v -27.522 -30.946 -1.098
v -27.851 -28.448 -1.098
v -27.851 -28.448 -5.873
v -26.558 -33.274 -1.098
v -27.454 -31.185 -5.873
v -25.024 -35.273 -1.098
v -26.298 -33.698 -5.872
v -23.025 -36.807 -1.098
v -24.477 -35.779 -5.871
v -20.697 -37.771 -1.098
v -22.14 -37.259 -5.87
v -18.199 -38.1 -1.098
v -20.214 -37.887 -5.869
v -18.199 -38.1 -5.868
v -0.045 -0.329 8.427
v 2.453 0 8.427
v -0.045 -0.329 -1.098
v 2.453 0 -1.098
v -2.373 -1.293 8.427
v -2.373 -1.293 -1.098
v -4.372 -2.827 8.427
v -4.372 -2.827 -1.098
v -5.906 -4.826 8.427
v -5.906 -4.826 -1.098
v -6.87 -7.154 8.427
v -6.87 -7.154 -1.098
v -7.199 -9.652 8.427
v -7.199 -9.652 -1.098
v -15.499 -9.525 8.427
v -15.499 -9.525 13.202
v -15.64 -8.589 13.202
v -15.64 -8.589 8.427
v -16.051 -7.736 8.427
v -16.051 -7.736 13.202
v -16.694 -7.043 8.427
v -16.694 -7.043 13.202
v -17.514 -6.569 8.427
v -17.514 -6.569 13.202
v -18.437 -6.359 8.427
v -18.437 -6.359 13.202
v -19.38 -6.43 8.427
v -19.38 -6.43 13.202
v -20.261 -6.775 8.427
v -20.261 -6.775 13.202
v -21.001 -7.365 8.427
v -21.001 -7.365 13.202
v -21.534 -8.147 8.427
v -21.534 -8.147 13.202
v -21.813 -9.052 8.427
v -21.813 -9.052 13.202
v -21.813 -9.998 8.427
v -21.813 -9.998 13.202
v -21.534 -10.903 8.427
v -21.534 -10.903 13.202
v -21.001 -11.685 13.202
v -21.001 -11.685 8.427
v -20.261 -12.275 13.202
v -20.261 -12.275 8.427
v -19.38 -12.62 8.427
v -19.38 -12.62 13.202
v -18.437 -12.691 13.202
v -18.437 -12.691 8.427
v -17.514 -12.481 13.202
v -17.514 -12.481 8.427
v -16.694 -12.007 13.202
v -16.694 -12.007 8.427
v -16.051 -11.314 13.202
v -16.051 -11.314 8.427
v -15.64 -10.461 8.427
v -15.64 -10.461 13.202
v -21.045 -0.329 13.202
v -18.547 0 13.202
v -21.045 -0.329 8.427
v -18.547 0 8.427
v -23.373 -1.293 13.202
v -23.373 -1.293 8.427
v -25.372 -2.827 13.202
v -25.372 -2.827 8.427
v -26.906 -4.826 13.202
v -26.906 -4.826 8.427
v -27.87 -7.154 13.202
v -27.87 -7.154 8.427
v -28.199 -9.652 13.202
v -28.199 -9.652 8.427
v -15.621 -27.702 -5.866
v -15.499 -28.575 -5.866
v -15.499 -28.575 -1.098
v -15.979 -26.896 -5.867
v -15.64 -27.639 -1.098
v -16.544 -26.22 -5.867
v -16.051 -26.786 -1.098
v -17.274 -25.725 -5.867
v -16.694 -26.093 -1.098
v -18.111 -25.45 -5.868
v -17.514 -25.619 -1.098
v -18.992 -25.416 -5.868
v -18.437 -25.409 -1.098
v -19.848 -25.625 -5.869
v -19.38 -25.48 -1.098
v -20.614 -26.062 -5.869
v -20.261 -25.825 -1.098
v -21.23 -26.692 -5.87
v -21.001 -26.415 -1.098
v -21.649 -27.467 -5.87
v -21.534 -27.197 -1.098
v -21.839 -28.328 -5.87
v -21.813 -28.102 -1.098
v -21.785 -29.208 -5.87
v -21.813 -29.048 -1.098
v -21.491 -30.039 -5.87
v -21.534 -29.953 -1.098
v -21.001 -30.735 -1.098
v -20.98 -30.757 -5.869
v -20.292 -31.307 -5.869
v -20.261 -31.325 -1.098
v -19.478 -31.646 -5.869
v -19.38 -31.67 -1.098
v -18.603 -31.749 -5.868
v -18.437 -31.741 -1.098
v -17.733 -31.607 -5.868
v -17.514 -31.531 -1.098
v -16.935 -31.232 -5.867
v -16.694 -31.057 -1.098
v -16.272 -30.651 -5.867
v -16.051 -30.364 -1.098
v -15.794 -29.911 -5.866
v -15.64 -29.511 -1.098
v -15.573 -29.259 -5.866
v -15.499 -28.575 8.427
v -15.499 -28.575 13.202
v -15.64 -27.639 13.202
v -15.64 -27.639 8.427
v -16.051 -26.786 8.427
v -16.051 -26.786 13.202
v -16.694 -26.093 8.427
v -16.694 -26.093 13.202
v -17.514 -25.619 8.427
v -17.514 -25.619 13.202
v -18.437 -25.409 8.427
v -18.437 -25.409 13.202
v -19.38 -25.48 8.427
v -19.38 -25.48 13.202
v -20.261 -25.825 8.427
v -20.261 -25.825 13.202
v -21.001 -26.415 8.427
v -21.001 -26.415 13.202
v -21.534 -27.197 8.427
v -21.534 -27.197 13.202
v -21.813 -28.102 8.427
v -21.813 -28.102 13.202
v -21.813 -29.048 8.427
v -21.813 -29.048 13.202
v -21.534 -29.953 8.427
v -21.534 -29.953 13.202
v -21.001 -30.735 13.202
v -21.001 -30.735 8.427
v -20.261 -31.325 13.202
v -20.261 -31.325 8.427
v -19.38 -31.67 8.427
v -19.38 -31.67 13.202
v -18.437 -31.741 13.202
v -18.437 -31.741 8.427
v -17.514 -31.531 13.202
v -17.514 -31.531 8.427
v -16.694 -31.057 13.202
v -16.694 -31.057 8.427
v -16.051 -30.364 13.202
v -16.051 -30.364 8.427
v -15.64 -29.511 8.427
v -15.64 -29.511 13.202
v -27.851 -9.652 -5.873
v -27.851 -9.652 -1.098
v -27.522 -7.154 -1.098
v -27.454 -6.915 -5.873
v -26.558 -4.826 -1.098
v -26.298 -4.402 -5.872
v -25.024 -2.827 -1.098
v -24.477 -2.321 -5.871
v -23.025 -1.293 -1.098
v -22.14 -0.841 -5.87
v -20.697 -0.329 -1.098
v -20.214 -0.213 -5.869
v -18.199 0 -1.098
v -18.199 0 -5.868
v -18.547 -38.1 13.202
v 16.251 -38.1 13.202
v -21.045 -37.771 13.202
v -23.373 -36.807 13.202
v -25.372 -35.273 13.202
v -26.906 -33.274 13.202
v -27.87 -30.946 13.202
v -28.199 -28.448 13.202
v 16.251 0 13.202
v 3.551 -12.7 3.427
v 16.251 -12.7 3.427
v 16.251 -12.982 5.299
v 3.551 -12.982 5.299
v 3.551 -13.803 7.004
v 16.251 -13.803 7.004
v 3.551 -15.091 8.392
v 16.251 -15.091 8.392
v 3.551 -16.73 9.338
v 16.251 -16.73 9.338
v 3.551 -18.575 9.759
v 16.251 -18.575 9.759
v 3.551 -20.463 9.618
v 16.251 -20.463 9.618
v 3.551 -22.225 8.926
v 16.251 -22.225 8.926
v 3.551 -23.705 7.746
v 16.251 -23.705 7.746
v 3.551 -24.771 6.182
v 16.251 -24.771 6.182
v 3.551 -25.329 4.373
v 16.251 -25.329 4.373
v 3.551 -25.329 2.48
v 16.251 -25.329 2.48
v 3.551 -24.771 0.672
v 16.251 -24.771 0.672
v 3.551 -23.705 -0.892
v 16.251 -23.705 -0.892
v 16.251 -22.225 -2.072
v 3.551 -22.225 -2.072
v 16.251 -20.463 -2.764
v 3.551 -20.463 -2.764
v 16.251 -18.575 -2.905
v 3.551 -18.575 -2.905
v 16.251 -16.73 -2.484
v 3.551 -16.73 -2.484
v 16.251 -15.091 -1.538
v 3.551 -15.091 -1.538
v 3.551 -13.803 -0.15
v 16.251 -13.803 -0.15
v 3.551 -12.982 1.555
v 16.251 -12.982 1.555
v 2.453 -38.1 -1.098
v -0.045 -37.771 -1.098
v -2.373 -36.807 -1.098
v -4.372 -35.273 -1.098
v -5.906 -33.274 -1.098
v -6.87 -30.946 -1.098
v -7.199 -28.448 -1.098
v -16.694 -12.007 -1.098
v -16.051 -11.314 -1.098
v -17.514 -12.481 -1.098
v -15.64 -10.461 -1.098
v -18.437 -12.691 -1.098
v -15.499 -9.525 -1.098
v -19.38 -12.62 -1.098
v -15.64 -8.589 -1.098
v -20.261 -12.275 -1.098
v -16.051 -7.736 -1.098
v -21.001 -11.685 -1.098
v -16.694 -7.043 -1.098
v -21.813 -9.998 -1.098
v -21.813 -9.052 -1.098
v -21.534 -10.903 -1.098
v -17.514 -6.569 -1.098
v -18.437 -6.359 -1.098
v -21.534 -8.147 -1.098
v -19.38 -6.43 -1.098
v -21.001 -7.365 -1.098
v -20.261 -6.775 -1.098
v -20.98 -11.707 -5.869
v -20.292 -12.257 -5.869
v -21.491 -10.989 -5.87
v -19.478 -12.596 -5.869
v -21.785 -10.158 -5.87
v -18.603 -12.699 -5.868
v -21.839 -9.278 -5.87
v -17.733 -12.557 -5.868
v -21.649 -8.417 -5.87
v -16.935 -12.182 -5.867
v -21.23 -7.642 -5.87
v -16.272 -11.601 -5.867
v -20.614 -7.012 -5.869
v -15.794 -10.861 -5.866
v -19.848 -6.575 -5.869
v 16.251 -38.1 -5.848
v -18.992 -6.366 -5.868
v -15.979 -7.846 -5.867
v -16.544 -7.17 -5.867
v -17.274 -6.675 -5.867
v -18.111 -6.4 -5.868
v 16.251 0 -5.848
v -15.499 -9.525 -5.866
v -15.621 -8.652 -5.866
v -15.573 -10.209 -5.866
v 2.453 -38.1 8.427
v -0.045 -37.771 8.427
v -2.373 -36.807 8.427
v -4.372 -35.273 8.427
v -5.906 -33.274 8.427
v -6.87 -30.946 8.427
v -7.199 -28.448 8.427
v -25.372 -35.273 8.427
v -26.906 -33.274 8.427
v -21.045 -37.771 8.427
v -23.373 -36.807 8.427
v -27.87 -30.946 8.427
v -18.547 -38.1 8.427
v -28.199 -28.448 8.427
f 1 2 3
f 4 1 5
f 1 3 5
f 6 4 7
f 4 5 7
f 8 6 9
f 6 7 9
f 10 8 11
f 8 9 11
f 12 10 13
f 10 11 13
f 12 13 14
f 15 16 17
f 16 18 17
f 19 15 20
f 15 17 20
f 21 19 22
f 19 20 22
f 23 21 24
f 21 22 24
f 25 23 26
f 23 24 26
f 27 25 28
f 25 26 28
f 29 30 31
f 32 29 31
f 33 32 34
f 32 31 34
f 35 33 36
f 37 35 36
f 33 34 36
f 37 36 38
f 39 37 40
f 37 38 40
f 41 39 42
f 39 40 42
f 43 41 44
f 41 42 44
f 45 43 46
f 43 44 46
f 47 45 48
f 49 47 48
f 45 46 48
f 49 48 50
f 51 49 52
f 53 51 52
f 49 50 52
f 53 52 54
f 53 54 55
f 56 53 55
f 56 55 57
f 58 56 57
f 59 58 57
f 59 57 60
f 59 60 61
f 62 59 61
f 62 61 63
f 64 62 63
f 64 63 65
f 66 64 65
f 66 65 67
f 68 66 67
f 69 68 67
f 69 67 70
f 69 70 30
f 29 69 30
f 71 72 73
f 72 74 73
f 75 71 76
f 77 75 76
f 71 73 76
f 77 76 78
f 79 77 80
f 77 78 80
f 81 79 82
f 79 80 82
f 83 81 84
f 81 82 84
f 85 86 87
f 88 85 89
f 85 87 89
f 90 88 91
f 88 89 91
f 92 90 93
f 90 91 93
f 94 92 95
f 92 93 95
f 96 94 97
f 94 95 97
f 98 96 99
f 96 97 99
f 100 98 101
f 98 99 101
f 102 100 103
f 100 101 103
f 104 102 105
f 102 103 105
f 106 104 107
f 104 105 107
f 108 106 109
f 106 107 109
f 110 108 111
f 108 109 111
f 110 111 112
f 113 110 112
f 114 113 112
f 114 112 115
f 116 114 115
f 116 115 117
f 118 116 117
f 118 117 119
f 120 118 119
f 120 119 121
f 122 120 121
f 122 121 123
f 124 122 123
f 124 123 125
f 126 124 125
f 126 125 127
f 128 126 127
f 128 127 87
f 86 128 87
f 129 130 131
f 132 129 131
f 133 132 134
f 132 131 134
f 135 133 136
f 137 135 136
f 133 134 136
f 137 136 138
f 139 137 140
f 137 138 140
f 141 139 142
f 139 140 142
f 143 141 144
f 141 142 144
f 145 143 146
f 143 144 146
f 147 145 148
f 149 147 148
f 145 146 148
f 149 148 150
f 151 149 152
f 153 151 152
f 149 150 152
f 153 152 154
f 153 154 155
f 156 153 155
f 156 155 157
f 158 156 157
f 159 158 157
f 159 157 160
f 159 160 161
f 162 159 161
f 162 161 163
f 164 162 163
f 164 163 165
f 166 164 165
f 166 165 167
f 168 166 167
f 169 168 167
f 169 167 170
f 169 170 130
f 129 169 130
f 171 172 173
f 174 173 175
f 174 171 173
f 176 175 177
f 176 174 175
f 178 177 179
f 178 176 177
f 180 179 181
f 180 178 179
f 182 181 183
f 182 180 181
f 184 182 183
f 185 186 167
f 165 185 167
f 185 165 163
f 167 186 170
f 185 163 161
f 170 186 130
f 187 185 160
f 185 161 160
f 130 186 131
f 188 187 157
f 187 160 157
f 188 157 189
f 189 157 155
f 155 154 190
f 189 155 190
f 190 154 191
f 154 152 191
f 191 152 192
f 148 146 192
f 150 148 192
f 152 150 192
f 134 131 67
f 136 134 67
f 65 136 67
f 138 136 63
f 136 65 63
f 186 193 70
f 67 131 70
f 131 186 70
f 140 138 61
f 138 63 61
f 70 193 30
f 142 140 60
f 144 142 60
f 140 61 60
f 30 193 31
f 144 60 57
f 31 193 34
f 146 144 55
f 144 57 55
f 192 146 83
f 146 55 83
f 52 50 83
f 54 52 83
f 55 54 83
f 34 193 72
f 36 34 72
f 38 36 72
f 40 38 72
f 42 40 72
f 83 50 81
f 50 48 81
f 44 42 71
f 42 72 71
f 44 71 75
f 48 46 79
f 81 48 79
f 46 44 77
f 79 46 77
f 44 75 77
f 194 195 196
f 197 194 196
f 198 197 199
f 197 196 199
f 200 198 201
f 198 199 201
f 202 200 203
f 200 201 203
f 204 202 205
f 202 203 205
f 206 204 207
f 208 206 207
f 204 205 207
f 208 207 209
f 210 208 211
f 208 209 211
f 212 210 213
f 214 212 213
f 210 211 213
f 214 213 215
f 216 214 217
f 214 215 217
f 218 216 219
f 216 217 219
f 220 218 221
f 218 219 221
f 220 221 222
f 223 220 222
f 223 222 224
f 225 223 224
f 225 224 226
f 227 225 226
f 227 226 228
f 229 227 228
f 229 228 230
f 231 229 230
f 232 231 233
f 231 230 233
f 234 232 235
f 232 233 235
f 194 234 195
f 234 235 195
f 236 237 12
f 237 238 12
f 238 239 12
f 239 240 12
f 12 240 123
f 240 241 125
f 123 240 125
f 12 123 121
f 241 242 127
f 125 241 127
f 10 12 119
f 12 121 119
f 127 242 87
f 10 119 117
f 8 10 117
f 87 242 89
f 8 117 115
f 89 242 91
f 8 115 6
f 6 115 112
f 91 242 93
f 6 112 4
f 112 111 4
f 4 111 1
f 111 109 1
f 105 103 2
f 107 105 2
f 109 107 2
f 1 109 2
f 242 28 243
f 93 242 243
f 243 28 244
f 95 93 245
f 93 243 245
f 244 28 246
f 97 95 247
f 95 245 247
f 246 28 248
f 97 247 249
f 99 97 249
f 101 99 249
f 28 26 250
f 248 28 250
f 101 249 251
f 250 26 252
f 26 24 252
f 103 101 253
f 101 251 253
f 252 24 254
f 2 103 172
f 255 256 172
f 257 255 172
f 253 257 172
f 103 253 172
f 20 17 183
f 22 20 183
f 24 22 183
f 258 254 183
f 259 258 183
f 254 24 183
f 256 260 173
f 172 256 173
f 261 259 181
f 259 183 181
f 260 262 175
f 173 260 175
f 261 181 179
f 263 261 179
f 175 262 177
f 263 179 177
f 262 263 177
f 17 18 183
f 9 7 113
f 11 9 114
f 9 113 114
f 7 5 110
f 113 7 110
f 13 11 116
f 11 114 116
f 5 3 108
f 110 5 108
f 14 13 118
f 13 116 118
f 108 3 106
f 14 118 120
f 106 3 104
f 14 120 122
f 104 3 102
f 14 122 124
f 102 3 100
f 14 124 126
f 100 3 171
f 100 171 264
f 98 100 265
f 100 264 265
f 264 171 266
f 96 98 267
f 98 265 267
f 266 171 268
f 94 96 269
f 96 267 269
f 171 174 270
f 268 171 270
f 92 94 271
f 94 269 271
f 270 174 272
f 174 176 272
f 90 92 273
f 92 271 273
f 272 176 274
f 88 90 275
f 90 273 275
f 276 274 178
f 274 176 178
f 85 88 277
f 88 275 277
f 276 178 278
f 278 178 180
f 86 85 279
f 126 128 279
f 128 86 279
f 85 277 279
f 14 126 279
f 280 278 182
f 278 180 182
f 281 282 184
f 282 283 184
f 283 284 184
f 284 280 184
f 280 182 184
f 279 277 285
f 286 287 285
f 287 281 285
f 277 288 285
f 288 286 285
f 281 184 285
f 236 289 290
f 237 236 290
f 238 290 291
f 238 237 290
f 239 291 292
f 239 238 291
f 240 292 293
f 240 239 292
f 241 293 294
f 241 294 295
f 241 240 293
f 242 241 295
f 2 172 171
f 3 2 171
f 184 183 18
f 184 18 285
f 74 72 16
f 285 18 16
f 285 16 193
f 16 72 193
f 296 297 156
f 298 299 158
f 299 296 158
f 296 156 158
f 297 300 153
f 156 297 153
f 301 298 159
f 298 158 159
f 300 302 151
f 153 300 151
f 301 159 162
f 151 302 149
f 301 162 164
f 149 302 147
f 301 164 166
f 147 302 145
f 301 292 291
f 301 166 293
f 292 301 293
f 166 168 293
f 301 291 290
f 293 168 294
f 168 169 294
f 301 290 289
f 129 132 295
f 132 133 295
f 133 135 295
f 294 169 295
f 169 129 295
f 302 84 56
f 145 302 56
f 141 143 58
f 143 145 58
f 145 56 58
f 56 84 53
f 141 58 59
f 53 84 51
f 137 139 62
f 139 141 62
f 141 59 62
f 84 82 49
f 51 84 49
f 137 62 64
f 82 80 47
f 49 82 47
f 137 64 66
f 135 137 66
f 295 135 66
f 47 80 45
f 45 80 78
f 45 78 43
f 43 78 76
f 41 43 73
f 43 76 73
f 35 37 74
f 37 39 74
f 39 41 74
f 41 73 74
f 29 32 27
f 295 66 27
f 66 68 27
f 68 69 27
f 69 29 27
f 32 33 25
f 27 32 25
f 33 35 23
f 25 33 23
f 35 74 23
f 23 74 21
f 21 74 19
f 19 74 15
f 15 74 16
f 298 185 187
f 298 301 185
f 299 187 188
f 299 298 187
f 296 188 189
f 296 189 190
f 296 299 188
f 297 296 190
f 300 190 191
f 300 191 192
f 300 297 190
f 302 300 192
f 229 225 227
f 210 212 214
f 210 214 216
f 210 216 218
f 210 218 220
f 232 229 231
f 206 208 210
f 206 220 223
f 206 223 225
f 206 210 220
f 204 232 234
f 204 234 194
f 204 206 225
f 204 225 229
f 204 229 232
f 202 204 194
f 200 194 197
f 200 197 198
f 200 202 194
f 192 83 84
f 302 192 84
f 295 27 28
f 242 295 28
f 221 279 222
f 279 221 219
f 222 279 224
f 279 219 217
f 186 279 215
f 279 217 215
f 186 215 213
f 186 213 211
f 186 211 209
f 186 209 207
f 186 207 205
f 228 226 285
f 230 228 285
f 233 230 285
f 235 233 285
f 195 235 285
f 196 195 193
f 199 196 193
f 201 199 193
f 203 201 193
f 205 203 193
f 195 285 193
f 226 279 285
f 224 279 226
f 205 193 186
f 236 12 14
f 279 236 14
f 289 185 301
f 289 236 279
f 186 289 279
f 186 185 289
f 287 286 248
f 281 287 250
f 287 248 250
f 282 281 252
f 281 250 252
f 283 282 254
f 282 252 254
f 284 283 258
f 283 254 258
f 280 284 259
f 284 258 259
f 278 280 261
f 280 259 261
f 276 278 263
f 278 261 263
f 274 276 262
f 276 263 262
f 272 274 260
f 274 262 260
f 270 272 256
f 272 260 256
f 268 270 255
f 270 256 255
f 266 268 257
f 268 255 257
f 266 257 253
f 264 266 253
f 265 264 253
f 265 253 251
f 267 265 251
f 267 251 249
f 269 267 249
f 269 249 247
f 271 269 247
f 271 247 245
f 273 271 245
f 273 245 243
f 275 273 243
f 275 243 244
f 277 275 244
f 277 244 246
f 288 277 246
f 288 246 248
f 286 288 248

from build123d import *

# Parameters (mm, degrees)
F1_DEPTH = 38.1
F2_R     = 3.175
F3_DEPTH = 38.1
F4_R     = 6.35
F5_DEPTH = 12.7
F6_R     = 9.652


with BuildPart() as f1:
    # F0 (on Front) → F1 (new body)
    with BuildSketch(Plane.XZ):
        Polygon((-27.85063, -5.873353), (16.251101, -5.847953), (16.251101, 13.202047), (-28.198899, 13.202047), (-28.198899, 8.426847), (-7.198899, 8.426847), (-7.198899, -1.098153), (-27.85063, -1.098153), align=None)
    extrude(amount=F1_DEPTH)

    # F2 (on face) → F3 (cut)
    with BuildSketch(Plane.XY.offset(13.202047)):
        with Locations((-18.673899, -28.575)):
            Circle(F2_R)
        with Locations((-18.673899, -9.525)):
            Circle(F2_R)
    extrude(amount=-F3_DEPTH, mode=Mode.SUBTRACT)

    # F4 (on face) → F5 (cut)
    with BuildSketch(Plane.YZ.offset(16.251101)):
        with Locations((-19.05, 3.426872)):
            Circle(F4_R)
    extrude(amount=-F5_DEPTH, mode=Mode.SUBTRACT)

    # F6
    f6_edges = [f1.edges().sort_by_distance(p)[0] for p in [
        (-28.198899, -38.1, 10.814447),
        (-28.198899, 0, 10.814447),
        (-27.85063, 0, -3.485753),
        (-27.85063, -38.1, -3.485753),
        (-7.198899, -38.1, 3.664347),
        (-7.198899, 0, 3.664347),
    ]]
    fillet(f6_edges, radius=F6_R)


solid = f1.part
